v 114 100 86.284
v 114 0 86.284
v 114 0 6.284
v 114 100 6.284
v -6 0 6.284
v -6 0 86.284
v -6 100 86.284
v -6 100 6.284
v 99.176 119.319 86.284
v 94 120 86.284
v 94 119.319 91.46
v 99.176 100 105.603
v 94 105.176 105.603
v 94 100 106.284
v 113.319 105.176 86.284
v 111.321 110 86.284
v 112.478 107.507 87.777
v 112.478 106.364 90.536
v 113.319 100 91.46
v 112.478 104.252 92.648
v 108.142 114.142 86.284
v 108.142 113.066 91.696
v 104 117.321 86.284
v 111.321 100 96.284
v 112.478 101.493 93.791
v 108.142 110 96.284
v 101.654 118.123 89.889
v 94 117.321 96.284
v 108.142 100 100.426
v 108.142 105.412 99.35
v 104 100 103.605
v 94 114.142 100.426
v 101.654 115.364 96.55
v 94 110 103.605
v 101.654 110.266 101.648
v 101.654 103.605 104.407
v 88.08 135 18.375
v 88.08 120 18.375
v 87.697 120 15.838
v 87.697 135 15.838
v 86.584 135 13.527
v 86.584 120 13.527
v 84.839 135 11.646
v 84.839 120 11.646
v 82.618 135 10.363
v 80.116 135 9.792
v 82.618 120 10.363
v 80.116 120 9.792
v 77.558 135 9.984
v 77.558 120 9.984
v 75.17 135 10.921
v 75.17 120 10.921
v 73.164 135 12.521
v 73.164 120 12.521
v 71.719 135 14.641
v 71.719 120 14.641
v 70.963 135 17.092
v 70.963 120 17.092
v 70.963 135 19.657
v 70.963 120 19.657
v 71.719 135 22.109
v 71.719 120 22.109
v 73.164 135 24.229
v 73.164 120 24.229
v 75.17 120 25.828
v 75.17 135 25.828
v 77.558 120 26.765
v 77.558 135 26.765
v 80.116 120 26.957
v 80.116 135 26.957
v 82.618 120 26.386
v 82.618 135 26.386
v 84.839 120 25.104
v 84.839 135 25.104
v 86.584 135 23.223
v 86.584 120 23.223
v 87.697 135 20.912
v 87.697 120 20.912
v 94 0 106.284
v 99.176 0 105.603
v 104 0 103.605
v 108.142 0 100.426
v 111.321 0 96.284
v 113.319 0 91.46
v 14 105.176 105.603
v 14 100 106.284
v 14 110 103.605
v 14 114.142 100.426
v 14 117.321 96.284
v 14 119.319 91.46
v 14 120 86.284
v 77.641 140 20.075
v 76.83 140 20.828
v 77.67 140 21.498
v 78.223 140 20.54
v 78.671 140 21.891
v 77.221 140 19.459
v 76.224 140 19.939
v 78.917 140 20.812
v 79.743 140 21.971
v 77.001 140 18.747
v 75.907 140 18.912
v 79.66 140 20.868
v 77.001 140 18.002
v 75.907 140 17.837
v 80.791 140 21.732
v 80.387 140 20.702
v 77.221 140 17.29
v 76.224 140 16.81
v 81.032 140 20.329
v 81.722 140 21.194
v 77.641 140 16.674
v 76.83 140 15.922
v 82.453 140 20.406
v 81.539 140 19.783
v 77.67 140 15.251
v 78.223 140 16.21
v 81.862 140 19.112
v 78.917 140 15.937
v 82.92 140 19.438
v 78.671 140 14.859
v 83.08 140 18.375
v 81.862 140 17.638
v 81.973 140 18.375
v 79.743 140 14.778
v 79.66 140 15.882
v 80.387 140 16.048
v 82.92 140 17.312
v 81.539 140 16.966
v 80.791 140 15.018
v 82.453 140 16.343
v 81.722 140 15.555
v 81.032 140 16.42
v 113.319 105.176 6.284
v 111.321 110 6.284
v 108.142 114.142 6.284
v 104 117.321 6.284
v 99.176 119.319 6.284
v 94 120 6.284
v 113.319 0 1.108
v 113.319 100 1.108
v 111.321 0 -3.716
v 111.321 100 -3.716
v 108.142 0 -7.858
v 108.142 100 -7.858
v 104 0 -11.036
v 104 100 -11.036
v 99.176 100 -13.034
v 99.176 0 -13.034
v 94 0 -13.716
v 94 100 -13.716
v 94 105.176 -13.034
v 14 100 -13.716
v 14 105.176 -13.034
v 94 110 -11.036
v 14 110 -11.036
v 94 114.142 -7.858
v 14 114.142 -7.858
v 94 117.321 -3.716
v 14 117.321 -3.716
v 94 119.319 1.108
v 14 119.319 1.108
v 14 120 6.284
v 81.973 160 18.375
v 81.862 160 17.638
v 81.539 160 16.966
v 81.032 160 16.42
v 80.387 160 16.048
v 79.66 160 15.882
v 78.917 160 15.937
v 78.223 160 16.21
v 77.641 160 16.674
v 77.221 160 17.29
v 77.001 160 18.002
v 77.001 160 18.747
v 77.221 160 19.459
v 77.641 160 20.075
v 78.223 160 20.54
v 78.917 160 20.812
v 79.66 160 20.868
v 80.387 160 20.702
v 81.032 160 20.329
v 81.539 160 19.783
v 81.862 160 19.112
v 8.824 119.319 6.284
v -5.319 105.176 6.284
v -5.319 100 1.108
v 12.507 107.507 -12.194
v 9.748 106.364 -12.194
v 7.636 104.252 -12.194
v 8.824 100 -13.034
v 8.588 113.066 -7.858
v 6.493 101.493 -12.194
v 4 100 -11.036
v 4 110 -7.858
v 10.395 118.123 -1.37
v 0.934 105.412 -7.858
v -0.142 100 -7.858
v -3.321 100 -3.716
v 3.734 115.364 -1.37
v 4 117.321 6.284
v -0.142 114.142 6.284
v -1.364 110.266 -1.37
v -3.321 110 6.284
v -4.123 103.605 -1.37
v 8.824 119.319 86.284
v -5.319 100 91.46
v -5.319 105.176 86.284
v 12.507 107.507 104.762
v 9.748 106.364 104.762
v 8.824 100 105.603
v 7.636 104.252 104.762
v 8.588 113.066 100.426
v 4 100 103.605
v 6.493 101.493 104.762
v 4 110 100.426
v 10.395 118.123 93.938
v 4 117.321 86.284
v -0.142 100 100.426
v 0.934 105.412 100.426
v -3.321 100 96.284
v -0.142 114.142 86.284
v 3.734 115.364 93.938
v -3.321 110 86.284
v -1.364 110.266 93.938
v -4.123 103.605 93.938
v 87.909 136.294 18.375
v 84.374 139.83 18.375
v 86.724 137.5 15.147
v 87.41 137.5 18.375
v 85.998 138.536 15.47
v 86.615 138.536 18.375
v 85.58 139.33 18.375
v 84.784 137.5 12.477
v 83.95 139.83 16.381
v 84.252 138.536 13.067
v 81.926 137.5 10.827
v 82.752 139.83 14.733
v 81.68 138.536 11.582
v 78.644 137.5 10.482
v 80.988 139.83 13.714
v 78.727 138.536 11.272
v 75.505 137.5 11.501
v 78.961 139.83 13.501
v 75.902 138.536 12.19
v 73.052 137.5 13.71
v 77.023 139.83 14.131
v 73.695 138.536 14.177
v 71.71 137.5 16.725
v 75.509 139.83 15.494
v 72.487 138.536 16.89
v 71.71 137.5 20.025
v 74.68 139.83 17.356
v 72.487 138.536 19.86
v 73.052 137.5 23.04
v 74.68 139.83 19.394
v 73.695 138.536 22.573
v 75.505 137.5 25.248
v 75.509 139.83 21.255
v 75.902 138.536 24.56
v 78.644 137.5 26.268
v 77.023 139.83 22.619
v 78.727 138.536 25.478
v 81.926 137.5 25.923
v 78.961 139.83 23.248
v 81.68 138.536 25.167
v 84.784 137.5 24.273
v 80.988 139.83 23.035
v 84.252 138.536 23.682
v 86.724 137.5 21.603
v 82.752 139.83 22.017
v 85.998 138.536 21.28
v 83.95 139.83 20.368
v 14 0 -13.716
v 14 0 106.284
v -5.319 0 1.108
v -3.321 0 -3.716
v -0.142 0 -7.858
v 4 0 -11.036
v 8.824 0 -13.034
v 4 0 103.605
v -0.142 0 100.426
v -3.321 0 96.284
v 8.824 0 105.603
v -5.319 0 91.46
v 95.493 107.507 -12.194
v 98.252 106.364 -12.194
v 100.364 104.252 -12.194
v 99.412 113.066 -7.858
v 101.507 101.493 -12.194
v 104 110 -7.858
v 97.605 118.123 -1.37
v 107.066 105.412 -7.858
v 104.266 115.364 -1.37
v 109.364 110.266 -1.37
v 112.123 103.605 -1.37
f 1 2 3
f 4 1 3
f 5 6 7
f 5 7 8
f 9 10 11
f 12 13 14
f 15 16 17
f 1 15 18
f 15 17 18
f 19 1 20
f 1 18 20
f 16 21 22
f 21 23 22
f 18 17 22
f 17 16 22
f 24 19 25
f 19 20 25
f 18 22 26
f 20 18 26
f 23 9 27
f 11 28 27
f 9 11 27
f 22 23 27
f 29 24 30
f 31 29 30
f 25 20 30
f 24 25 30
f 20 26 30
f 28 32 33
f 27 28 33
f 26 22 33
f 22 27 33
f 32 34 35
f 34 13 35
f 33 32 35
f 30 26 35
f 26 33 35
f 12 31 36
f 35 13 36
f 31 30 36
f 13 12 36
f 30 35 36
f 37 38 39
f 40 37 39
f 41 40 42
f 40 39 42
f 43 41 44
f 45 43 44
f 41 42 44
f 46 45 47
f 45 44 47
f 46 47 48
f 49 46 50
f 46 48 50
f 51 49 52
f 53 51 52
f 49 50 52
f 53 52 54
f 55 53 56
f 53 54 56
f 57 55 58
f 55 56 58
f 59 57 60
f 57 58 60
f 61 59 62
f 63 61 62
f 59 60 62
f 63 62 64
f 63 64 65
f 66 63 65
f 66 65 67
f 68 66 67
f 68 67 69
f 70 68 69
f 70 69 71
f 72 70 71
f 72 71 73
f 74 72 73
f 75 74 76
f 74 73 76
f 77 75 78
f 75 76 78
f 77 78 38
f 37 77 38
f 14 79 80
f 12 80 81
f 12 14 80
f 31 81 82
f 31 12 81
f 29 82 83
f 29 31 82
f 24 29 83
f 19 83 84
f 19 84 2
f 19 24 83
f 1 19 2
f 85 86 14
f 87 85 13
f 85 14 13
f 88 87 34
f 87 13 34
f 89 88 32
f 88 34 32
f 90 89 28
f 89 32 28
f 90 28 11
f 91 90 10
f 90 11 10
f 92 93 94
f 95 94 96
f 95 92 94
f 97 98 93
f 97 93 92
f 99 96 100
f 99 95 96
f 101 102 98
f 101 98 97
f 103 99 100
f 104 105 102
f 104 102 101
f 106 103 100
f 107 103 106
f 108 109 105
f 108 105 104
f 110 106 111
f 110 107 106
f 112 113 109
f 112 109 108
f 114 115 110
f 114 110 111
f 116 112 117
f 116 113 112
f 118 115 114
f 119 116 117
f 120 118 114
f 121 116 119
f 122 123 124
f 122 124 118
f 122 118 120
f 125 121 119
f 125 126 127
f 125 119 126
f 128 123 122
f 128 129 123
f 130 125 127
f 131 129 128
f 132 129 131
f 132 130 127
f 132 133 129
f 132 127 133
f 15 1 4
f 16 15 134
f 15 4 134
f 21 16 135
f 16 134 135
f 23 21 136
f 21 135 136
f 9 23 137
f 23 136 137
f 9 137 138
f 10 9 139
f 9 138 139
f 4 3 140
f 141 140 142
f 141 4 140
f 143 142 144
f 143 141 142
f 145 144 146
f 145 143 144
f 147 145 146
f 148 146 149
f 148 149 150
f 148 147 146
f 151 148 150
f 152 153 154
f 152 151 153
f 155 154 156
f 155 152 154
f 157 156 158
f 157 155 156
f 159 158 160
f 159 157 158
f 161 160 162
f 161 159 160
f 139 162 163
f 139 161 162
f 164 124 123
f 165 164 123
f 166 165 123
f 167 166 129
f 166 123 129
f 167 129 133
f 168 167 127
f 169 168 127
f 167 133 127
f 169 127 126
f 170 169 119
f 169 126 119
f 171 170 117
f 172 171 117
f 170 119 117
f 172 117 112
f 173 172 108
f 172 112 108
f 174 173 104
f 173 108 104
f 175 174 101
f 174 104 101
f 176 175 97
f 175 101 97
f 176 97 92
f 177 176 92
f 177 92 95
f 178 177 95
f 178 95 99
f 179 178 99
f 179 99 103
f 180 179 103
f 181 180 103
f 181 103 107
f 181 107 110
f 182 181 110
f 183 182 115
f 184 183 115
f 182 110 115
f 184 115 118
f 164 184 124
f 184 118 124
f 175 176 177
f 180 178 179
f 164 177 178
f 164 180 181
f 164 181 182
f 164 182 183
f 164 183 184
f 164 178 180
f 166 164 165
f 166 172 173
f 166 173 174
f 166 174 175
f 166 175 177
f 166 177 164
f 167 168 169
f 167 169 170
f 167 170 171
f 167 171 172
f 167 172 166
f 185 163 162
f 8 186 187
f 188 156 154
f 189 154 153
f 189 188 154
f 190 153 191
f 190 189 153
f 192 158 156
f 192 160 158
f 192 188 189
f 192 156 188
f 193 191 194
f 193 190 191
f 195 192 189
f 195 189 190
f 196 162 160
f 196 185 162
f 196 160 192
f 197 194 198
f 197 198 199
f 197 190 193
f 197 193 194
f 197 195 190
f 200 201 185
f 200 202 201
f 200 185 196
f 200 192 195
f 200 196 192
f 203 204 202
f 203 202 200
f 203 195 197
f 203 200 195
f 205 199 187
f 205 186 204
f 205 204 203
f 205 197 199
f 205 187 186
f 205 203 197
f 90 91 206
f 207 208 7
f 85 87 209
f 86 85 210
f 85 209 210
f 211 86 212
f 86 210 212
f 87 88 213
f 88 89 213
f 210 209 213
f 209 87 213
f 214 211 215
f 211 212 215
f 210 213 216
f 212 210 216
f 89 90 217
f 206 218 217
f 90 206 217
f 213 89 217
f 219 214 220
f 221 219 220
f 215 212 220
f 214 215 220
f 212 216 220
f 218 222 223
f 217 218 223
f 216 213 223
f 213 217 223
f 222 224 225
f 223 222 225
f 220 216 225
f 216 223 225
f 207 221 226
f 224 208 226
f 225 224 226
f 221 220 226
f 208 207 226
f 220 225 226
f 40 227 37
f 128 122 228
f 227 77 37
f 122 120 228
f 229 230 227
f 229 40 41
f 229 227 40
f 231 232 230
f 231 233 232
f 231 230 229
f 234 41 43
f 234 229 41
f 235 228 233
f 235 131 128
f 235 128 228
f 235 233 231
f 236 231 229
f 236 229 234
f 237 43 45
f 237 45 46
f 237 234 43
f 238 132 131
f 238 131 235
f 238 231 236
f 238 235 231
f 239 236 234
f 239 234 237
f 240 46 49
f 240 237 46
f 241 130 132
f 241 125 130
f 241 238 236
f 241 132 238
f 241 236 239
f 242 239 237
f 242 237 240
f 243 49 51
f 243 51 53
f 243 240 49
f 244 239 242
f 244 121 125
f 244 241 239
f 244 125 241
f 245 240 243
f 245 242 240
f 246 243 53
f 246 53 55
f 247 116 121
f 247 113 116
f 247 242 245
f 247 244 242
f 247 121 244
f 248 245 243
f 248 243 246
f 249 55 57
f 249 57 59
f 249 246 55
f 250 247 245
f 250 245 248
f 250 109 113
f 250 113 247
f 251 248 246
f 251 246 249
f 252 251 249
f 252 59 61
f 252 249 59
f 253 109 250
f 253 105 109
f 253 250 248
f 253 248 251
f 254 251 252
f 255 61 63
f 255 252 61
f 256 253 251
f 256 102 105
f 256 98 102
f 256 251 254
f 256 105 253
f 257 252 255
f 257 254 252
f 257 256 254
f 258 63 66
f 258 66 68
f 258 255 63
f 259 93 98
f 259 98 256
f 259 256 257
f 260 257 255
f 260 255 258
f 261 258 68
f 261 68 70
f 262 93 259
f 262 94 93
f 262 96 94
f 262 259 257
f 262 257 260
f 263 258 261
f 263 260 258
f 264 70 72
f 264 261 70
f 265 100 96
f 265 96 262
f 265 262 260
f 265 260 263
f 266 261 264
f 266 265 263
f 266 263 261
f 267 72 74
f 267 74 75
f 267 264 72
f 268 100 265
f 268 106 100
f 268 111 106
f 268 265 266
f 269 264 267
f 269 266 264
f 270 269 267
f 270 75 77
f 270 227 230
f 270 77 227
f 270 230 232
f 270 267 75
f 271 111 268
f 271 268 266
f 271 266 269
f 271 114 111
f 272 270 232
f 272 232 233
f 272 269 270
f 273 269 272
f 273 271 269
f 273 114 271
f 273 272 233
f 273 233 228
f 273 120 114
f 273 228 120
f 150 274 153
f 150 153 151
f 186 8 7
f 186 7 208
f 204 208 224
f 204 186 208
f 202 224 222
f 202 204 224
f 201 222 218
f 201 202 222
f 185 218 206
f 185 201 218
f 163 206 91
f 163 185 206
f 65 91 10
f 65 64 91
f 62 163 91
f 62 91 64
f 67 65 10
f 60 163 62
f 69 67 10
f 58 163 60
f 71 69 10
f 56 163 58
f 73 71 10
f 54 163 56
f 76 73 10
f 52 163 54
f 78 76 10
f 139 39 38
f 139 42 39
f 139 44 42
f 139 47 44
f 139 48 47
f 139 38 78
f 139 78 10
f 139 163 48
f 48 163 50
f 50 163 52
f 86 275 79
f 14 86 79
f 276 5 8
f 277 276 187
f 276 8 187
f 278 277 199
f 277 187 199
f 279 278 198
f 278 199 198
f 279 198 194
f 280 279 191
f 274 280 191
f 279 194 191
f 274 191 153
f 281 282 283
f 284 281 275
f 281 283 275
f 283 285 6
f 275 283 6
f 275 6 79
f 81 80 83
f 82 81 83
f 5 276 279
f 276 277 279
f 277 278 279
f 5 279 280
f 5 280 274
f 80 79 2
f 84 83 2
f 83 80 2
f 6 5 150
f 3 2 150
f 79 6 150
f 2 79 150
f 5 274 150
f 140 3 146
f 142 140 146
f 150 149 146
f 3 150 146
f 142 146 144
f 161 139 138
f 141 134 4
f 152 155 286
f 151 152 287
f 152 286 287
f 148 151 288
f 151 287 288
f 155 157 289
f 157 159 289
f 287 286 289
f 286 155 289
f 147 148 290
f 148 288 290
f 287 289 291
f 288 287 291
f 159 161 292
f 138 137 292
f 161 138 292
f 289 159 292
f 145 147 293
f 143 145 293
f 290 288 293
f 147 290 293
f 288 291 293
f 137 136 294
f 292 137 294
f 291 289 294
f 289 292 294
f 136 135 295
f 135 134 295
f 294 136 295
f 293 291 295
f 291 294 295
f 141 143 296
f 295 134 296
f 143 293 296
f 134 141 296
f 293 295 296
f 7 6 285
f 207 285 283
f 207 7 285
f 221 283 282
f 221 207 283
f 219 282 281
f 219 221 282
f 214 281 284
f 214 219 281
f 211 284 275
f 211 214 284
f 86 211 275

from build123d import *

# Parameters (mm, degrees)
SKETCH1_W           = 120
SKETCH1_H           = 120
BOSS_EXTRUDE1_DEPTH = 120
FILLET1_R           = 20
SKETCH4_R           = 8.6064573
BOSS_EXTRUDE4_DEPTH = 20
SKETCH5_R           = 2.5
BOSS_EXTRUDE5_DEPTH = 20
FILLET2_R           = 5


with BuildPart() as part:
    # Sketch1 → Boss-Extrude1 (new body)
    with BuildSketch(Plane(origin=(0, 0, 0), x_dir=(1, 0, 0), z_dir=(0, 1, 0))):
        with Locations((54, -46.284032095)):
            Rectangle(SKETCH1_W, SKETCH1_H)
    extrude(amount=BOSS_EXTRUDE1_DEPTH)

    # Fillet1
    fillet1_edges = [part.edges().sort_by_distance(p)[0] for p in [
        (-6, 120, 46.284032095),
        (54, 120, 106.284032095),
        (114, 120, 46.284032095),
        (54, 120, -13.715967905),
        (114, 60, 106.284032095),
        (-6, 60, 106.284032095),
        (-6, 60, -13.715967905),
        (114, 60, -13.715967905),
    ]]
    fillet(fillet1_edges, radius=FILLET1_R)

    # Sketch4 → Boss-Extrude4 (add)
    with BuildSketch(Plane(origin=(0, 120, 0), x_dir=(1, 0, 0), z_dir=(0, 1, 0))):
        with Locations((79.473330559, -18.374712085)):
            Circle(SKETCH4_R)
    extrude(amount=BOSS_EXTRUDE4_DEPTH)

    # Sketch5 → Boss-Extrude5 (add)
    with BuildSketch(Plane(origin=(0, 140, 0), x_dir=(1, 0, 0), z_dir=(0, 1, 0))):
        with Locations((79.473330559, -18.374712085)):
            Circle(SKETCH5_R)
    extrude(amount=BOSS_EXTRUDE5_DEPTH)

    # Fillet2
    fillet2_edges = [part.edges().sort_by_distance(p)[0] for p in [
        (70.866873258, 140, 18.374712085),
    ]]
    fillet(fillet2_edges, radius=FILLET2_R)


solid = part.part
